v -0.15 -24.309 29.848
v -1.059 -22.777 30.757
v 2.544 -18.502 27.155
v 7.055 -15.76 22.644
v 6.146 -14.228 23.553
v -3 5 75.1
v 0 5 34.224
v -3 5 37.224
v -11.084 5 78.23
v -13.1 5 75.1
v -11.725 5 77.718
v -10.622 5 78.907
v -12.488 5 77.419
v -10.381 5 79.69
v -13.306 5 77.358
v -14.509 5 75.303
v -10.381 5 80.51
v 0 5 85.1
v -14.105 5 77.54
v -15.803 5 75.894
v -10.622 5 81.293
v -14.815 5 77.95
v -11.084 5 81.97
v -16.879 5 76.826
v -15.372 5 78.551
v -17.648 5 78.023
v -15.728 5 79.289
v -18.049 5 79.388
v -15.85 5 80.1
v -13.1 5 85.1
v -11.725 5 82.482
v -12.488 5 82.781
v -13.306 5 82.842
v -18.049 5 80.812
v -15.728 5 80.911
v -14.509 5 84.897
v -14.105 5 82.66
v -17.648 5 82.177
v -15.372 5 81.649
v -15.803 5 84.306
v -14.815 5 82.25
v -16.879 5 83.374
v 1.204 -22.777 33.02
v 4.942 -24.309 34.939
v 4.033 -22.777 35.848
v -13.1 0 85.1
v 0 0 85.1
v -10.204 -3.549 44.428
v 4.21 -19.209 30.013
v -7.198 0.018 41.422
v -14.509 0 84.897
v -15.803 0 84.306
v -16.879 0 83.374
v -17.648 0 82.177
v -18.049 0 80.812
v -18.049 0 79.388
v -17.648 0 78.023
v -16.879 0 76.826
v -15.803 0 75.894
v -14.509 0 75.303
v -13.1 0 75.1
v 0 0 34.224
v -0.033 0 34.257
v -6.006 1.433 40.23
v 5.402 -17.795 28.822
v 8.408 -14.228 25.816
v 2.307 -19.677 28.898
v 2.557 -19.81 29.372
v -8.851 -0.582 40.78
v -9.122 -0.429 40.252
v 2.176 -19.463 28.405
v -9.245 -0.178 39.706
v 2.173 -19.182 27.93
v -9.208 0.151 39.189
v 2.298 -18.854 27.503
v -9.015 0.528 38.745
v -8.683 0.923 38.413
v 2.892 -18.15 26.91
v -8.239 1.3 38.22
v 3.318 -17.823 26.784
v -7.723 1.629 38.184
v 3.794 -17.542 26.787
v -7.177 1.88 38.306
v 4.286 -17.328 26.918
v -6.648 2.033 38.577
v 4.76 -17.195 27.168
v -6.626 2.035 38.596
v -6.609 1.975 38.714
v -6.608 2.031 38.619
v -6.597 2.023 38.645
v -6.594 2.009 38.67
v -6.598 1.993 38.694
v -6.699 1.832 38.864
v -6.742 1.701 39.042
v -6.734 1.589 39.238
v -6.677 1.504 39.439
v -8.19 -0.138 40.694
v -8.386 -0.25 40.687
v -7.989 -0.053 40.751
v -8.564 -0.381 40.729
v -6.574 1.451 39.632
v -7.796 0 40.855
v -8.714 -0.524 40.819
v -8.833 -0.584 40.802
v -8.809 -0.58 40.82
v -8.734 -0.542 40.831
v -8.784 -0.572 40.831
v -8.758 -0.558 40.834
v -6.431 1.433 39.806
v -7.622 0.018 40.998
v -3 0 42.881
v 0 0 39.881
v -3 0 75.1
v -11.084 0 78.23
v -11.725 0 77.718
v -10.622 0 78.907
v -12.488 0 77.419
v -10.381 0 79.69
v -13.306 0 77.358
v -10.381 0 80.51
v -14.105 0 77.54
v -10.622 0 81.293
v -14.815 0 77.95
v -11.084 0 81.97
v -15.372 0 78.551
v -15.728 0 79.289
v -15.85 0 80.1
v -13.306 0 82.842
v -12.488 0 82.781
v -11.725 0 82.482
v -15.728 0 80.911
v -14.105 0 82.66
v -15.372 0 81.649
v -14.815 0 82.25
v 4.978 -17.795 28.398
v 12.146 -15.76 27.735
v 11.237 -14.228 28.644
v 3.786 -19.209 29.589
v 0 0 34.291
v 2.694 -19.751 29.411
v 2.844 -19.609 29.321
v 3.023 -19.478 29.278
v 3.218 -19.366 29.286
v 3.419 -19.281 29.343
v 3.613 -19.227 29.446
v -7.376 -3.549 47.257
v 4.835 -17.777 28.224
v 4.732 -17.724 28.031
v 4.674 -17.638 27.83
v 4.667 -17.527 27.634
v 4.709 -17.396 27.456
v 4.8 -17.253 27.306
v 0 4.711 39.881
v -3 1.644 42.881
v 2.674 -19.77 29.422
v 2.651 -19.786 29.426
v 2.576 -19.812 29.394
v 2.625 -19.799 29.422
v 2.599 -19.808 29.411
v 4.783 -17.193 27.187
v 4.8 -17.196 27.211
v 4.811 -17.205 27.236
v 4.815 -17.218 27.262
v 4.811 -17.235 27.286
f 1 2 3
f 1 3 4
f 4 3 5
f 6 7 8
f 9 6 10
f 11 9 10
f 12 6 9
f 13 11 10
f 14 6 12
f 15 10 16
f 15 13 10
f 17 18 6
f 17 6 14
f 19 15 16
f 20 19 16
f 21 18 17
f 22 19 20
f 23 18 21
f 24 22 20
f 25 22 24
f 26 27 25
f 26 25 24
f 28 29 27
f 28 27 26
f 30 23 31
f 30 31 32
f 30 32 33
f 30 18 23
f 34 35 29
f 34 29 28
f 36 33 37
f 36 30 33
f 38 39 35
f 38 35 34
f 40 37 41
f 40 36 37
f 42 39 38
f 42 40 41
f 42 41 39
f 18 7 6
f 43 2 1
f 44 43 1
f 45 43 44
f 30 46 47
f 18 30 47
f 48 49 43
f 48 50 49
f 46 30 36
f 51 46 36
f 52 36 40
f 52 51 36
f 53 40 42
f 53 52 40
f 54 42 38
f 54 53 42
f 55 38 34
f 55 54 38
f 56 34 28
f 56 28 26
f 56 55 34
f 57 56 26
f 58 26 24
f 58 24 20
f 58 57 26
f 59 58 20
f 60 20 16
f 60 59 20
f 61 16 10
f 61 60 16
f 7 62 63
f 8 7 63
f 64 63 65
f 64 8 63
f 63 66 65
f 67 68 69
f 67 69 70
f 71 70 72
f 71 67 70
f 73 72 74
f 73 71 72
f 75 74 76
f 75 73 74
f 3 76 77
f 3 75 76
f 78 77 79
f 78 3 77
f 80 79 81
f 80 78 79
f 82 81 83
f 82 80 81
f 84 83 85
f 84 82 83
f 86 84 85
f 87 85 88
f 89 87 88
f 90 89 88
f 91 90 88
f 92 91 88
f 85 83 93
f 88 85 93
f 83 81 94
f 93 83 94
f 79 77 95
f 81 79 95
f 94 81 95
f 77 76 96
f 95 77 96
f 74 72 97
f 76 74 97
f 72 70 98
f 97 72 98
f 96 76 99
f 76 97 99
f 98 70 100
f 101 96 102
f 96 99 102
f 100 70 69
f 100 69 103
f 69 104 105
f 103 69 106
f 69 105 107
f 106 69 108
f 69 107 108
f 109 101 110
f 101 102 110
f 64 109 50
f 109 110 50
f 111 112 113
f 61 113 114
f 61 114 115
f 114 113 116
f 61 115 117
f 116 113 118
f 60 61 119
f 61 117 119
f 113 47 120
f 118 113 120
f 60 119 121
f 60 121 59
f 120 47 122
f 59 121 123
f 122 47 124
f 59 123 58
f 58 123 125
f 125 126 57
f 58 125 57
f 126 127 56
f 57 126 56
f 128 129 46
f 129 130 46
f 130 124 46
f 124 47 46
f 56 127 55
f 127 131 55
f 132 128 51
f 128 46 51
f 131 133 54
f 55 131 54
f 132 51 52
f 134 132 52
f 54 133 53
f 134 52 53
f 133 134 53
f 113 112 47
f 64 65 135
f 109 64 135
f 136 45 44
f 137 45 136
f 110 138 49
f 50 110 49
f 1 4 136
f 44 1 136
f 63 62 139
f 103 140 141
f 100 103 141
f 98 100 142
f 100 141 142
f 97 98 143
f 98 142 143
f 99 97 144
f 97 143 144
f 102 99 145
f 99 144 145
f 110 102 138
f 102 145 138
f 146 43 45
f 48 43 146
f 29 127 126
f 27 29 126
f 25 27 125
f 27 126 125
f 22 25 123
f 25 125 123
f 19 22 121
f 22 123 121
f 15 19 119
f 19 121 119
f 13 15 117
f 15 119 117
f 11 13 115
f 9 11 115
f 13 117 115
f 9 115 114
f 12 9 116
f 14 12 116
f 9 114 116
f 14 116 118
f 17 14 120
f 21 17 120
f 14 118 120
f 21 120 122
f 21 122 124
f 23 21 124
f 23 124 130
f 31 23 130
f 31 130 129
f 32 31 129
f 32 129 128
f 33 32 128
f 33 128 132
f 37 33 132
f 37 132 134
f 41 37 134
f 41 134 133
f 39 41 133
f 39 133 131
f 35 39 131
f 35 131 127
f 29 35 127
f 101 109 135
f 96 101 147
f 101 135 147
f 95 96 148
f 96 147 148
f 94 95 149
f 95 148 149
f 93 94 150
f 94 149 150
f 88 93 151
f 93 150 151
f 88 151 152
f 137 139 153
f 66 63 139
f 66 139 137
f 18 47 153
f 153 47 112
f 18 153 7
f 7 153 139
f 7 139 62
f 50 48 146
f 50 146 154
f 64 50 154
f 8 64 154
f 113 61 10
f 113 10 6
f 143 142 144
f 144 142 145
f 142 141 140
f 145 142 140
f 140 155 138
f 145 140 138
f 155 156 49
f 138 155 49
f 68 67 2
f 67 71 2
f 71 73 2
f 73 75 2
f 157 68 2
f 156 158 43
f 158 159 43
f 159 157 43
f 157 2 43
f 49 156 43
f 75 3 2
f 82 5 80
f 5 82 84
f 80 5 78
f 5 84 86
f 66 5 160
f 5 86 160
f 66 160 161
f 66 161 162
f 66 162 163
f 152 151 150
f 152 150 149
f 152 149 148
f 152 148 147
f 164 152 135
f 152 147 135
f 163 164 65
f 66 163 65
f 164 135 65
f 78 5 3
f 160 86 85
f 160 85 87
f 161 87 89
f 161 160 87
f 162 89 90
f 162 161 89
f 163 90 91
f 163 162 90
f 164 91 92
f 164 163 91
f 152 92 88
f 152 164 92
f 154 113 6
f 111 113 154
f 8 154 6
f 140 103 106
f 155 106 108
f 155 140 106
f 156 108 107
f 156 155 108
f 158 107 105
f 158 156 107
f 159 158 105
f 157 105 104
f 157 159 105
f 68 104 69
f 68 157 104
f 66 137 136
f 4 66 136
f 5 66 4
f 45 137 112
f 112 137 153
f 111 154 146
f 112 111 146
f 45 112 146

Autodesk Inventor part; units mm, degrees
ref_plane "YZ Plane" through (0, 0, 0) normal (1, 0, 0) x (0, 1, 0)
ref_plane "XZ Plane" through (0, 0, 0) normal (0, 1, 0) x (-1, 0, 0)
ref_plane "XY Plane" through (0, 0, 0) normal (0, 0, 1) x (1, 0, 0)
sketch "Sketch2" plane through (0, 0, 0) normal (0, 1, 0) x (-1, 0, 0)
  circle A0 centre (13.1, 80.1) radius 2.75
  circle A1 centre (80.1, 13.1) radius 2.75 construction
  line L0 (13.1, 80.1) -> (13.1, 13.1)
  line L1 (13.1, 13.1) -> (80.1, 13.1)
  line L2 (3, 37.224) -> (37.224, 3)
  line L3 (3, 37.224) -> (51.4, 37.224) construction
  circle A2 centre (80.1, 13.1) radius 2.75
  line L4 (3.1, 112.1) -> (3.1, 79.1)
  line L5 (79.1, 3.1) -> (112.1, 3.1)
  circle A3 centre (13.1, 80.1) radius 5
  line L6 (13.1, 75.1) -> (3, 75.1)
  line L7 (3, 75.1) -> (3, 3)
  line L8 (13.1, 85.1) -> (0, 85.1)
  line L9 (0, 85.1) -> (0, 0)
  circle A4 centre (80.1, 13.1) radius 5
  line L10 (85.1, 13.1) -> (85.1, 0)
  line L11 (75.1, 13.1) -> (75.1, 3)
  line L12 (75.1, 3) -> (3, 3)
  line L13 (85.1, 0) -> (0, 0)
  line L14 (3, 37.224) -> (-4.0711, 30.1529)
  line L15 (3, 37.224) -> (13, 37.224) construction
  point P0 (0, 0)
  point P1 (0, 34.224)
  dimension "d11" = 48.4
  dimension "d12" = 45
  dimension "d13" = 10
  dimension "d14" = 10.1
  dimension "d15" = 13.1
  dimension "d16" = 3
  dimension "d17" = 10
  dimension "d18" = 13.1
  dimension "d19" = 10.1
  dimension "d20" = 10
  dimension "d21" = 135
extrude "Extrusion2" add sketch "Sketch2" along normal blind 5 contours L6 L7 L14 L9 L8 A3 | A3
sketch "Sketch4" plane through (-3, 0, 37.224) normal (-0.7071068, 0, -0.7071068) x (-0.7071068, 0, 0.7071068)
  line L0 (0, 0) -> (0, 5) projected
  line L1 (0, 5) -> (-16.134, -14.2277)
  line L2 (0, 5) -> (25.1, 5) construction
  line L3 (-5.9456, -22.7768) -> (10.1884, -3.5491)
  line L4 (10.1884, -3.5491) -> (0, 5)
  line L5 (-5.9456, -22.7768) -> (-16.134, -14.2277)
  point P0 (-28.4426, 0)
  dimension "d33" = 130
  dimension "d34" = 25.1
  dimension "d35" = 13.3
  dimension "d37" = 25.1
extrude "Extrusion3" add sketch "Sketch4" against normal blind 4
sketch "Sketch6" plane through (0, -0.0562, 34.224) normal (-0.7071068, 0, -0.7071068) x (-0.7071068, 0, 0.7071068)
  line L0 (0, 5.0562) -> (4.2426, 5.0562) projected
  line L1 (0, 0.0562) -> (0, 5.0562) projected
  line L2 (0.0471, 0.0562) -> (-11.8913, -14.1715) projected
  line L3 (-11.8913, -14.1715) -> (-1.7029, -22.7206) projected
  line L4 (-1.7029, -22.7206) -> (14.431, -3.4929) projected
  line L5 (14.431, -3.4929) -> (4.2426, 5.0562) projected
  circle A0 centre (6.1229, -3.0486) radius 2.6
  line L6 (4.6432, 4.72) -> (14.755, -3.7647)
  circle A1 centre (-1.5906, -12.2411) radius 2.6
  line L7 (0, 0.0562) -> (0.0471, 0.0562) projected
  line L8 (14.431, -3.4929) -> (4.2426, 5.0562) projected
  line L9 (-6.7971, -18.4461) -> (10.7436, 2.4582)
  point P0 (-24.2, 0.0562)
  dimension "d38" = 5.2
  dimension "d39" = 5
  dimension "d40" = 12
extrude "Extrusion5" [suppressed]
fillet "Fillet1" [suppressed]
sketch "Sketch9" plane through (-0.1716, 0, 40.0524) normal (0.7071068, 0, 0.7071068) x (0.7071068, 0, -0.7071068)
  line L0 (4.1955, 0) -> (16.134, -14.2277) projected
  line L1 (16.134, -14.2277) -> (6.4922, -2.737)
  line L2 (6.4922, -2.737) -> (8.7903, -0.8087)
  line L3 (8.7903, -0.8087) -> (18.4321, -12.2994)
  line L4 (18.4321, -12.2994) -> (16.134, -14.2277)
  line L5 (5.9456, -22.7768) -> (16.134, -14.2277) projected
  line L6 (11.0398, -18.5023) -> (9.8066, -17.0326)
  line L7 (5.9456, -22.7768) -> (-3.6962, -11.2861)
  line L8 (-5.9944, -13.2145) -> (3.6474, -24.7052)
  line L9 (-3.6962, -11.2861) -> (-5.9944, -13.2145)
  line L10 (3.6474, -24.7052) -> (5.9456, -22.7768)
  point P0 (28.4426, 0)
  point P1 (4.6202, -0.5061)
  dimension "d46" = 15
  dimension "d47" = 3
extrude "Extrusion6" [suppressed]
sketch "Sketch10" plane through (8.4084, -14.2277, 25.8155) normal (0.4545195, -0.7660444, -0.4545195) x (0.7071068, 0, 0.7071068)
  line L0 (0, 0) -> (0, 13.3) projected
  line L1 (0, 0) -> (4, 0) projected
  line L2 (4, 13.3) -> (4, 0) projected
  line L3 (0, 13.3) -> (4, 13.3) projected
  line L4 (-0.6, 8.15) -> (0, 8.15)
  line L5 (0, -1.85) -> (0, 5.15)
  line L6 (0, 5.15) -> (-0.6, 5.15)
  arc A0 (-0.6, 5.15) -> (-1.099, 4.6815) centre (-0.6, 4.65) ccw
  arc A1 (-1.7225, 4.2287) -> (-1.099, 4.6815) centre (-1.598, 4.713) ccw
  arc A2 (-1.7225, 9.0713) -> (-1.7225, 4.2287) centre (-1.1, 6.65) ccw
  arc A3 (-1.099, 8.6185) -> (-1.7225, 9.0713) centre (-1.598, 8.587) ccw
  arc A4 (-1.099, 8.6185) -> (-0.6, 8.15) centre (-0.6, 8.65) ccw
  line L7 (0, 0) -> (0, 13.3) projected
  line L8 (0.6, 5.35) -> (-0.6, 5.35)
  arc A5 (-0.6, 5.35) -> (-1.2986, 4.6941) centre (-0.6, 4.65) ccw
  arc A6 (-1.6727, 4.4224) -> (-1.2986, 4.6941) centre (-1.598, 4.713) ccw
  arc A7 (-1.6727, 8.8776) -> (-1.6727, 4.4224) centre (-1.1, 6.65) ccw
  arc A8 (-1.2986, 8.6059) -> (-1.6727, 8.8776) centre (-1.598, 8.587) ccw
  arc A9 (-1.2986, 8.6059) -> (-0.6, 7.95) centre (-0.6, 8.65) ccw
  line L9 (-0.6, 7.95) -> (0.6, 7.95)
  line L10 (0.3, -1.85) -> (0.3, 5.45)
  line L11 (0.3, 5.45) -> (-0.6, 5.45)
  arc A10 (-0.6, 5.45) -> (-1.3984, 4.7004) centre (-0.6, 4.65) ccw
  arc A11 (-1.6478, 4.5193) -> (-1.3984, 4.7004) centre (-1.598, 4.713) ccw
  arc A12 (-1.6478, 8.7807) -> (-1.6478, 4.5193) centre (-1.1, 6.65) ccw
  arc A13 (-1.3984, 8.5996) -> (-1.6478, 8.7807) centre (-1.598, 8.587) ccw
  arc A14 (-1.3984, 8.5996) -> (-0.6, 7.85) centre (-0.6, 8.65) ccw
  line L12 (-0.6, 7.85) -> (0.4, 7.85)
  line L13 (0.4, -1.85) -> (0.4, 5.55)
  line L14 (0.4, 5.55) -> (-0.6, 5.55)
  arc A15 (-0.6, 5.55) -> (-1.4982, 4.7067) centre (-0.6, 4.65) ccw
  arc A16 (-1.6229, 4.6161) -> (-1.4982, 4.7067) centre (-1.598, 4.713) ccw
  arc A17 (-1.6229, 8.6839) -> (-1.6229, 4.6161) centre (-1.1, 6.65) ccw
  arc A18 (-1.4982, 8.5933) -> (-1.6229, 8.6839) centre (-1.598, 8.587) ccw
  arc A19 (-1.4982, 8.5933) -> (-0.6, 7.75) centre (-0.6, 8.65) ccw
  line L15 (-0.6, 7.75) -> (0.4, 7.75)
  point P0 (-24.2, -18.5744)
  point P1 (-11.4165, -11.1867)
  point P2 (0, 6.65)
  point P3 (0, 6.65)
  point P4 (0, 5.35)
  point P5 (0, 7.95)
  point P6 (0, 5.45)
  point P7 (0, 7.85)
  point P8 (0, 5.55)
  point P9 (0, 7.75)
  dimension "d64" = 2.5
  dimension "d65" = 0.6
  dimension "d66" = 1.1
  dimension "d67" = 0.2
  dimension "d68" = 0.3
  dimension "d69" = 0.4
extrude "Extrusion7" add sketch "Sketch10" against normal up to surface (25.1 mm away) contours L14 A15 A16 A17 A18 A19 L15 L0
sketch "Sketch11" plane through (11.2369, -14.2277, 28.644) normal (0.4545195, -0.7660444, -0.4545195) x (0.7071068, 0, 0.7071068)
  line L0 (-4, 0) -> (-4, 5.55) projected
  line L1 (-4, 0) -> (0, 0) projected
  line L2 (0, 13.3) -> (0, 0) projected
  line L3 (-4, 13.3) -> (0, 13.3) projected
  line L4 (0, 0) -> (0, 13.3)
  line L5 (0, 0) -> (-7.3, 0)
  line L6 (-7.7, 13.3) -> (0, 13.3)
  line L7 (0, 13.3) -> (0, 0)
  line L8 (-4, 7.75) -> (-4, 13.3) projected
  line L9 (-4, 7.75) -> (-4.6, 7.75) projected
  arc A0 (-5.4982, 8.5933) -> (-4.6, 7.75) centre (-4.6, 8.65) ccw projected
  arc A1 (-5.4982, 8.5933) -> (-5.6229, 8.6839) centre (-5.598, 8.587) ccw projected
  arc A2 (-5.6229, 8.6839) -> (-5.6229, 4.6161) centre (-5.1, 6.65) ccw projected
  arc A3 (-5.6229, 4.6161) -> (-5.4982, 4.7067) centre (-5.598, 4.713) ccw projected
  arc A4 (-4.6, 5.55) -> (-5.4982, 4.7067) centre (-4.6, 4.65) ccw projected
  line L10 (-4.6, 5.55) -> (-4, 5.55) projected
  line L11 (-7.2, 13.3) -> (-7.2, 0)
  arc A5 (-5.6229, 8.6839) -> (-5.6229, 4.6161) centre (-5.1, 6.65) ccw projected
  point P0 (-28.2, -18.5744)
  point P1 (-4, 0)
  point P2 (0, 13.3)
  point P3 (0, 0)
  point P4 (-4, 13.3)
  point P5 (-4, 13.3)
  point P6 (-4, 0)
  point P7 (-7.2, 6.65)
  point P8 (-7.2, 6.65)
extrude "Extrusion8" add sketch "Sketch11" along normal blind 2
properties part number "Pixy2 mount"
